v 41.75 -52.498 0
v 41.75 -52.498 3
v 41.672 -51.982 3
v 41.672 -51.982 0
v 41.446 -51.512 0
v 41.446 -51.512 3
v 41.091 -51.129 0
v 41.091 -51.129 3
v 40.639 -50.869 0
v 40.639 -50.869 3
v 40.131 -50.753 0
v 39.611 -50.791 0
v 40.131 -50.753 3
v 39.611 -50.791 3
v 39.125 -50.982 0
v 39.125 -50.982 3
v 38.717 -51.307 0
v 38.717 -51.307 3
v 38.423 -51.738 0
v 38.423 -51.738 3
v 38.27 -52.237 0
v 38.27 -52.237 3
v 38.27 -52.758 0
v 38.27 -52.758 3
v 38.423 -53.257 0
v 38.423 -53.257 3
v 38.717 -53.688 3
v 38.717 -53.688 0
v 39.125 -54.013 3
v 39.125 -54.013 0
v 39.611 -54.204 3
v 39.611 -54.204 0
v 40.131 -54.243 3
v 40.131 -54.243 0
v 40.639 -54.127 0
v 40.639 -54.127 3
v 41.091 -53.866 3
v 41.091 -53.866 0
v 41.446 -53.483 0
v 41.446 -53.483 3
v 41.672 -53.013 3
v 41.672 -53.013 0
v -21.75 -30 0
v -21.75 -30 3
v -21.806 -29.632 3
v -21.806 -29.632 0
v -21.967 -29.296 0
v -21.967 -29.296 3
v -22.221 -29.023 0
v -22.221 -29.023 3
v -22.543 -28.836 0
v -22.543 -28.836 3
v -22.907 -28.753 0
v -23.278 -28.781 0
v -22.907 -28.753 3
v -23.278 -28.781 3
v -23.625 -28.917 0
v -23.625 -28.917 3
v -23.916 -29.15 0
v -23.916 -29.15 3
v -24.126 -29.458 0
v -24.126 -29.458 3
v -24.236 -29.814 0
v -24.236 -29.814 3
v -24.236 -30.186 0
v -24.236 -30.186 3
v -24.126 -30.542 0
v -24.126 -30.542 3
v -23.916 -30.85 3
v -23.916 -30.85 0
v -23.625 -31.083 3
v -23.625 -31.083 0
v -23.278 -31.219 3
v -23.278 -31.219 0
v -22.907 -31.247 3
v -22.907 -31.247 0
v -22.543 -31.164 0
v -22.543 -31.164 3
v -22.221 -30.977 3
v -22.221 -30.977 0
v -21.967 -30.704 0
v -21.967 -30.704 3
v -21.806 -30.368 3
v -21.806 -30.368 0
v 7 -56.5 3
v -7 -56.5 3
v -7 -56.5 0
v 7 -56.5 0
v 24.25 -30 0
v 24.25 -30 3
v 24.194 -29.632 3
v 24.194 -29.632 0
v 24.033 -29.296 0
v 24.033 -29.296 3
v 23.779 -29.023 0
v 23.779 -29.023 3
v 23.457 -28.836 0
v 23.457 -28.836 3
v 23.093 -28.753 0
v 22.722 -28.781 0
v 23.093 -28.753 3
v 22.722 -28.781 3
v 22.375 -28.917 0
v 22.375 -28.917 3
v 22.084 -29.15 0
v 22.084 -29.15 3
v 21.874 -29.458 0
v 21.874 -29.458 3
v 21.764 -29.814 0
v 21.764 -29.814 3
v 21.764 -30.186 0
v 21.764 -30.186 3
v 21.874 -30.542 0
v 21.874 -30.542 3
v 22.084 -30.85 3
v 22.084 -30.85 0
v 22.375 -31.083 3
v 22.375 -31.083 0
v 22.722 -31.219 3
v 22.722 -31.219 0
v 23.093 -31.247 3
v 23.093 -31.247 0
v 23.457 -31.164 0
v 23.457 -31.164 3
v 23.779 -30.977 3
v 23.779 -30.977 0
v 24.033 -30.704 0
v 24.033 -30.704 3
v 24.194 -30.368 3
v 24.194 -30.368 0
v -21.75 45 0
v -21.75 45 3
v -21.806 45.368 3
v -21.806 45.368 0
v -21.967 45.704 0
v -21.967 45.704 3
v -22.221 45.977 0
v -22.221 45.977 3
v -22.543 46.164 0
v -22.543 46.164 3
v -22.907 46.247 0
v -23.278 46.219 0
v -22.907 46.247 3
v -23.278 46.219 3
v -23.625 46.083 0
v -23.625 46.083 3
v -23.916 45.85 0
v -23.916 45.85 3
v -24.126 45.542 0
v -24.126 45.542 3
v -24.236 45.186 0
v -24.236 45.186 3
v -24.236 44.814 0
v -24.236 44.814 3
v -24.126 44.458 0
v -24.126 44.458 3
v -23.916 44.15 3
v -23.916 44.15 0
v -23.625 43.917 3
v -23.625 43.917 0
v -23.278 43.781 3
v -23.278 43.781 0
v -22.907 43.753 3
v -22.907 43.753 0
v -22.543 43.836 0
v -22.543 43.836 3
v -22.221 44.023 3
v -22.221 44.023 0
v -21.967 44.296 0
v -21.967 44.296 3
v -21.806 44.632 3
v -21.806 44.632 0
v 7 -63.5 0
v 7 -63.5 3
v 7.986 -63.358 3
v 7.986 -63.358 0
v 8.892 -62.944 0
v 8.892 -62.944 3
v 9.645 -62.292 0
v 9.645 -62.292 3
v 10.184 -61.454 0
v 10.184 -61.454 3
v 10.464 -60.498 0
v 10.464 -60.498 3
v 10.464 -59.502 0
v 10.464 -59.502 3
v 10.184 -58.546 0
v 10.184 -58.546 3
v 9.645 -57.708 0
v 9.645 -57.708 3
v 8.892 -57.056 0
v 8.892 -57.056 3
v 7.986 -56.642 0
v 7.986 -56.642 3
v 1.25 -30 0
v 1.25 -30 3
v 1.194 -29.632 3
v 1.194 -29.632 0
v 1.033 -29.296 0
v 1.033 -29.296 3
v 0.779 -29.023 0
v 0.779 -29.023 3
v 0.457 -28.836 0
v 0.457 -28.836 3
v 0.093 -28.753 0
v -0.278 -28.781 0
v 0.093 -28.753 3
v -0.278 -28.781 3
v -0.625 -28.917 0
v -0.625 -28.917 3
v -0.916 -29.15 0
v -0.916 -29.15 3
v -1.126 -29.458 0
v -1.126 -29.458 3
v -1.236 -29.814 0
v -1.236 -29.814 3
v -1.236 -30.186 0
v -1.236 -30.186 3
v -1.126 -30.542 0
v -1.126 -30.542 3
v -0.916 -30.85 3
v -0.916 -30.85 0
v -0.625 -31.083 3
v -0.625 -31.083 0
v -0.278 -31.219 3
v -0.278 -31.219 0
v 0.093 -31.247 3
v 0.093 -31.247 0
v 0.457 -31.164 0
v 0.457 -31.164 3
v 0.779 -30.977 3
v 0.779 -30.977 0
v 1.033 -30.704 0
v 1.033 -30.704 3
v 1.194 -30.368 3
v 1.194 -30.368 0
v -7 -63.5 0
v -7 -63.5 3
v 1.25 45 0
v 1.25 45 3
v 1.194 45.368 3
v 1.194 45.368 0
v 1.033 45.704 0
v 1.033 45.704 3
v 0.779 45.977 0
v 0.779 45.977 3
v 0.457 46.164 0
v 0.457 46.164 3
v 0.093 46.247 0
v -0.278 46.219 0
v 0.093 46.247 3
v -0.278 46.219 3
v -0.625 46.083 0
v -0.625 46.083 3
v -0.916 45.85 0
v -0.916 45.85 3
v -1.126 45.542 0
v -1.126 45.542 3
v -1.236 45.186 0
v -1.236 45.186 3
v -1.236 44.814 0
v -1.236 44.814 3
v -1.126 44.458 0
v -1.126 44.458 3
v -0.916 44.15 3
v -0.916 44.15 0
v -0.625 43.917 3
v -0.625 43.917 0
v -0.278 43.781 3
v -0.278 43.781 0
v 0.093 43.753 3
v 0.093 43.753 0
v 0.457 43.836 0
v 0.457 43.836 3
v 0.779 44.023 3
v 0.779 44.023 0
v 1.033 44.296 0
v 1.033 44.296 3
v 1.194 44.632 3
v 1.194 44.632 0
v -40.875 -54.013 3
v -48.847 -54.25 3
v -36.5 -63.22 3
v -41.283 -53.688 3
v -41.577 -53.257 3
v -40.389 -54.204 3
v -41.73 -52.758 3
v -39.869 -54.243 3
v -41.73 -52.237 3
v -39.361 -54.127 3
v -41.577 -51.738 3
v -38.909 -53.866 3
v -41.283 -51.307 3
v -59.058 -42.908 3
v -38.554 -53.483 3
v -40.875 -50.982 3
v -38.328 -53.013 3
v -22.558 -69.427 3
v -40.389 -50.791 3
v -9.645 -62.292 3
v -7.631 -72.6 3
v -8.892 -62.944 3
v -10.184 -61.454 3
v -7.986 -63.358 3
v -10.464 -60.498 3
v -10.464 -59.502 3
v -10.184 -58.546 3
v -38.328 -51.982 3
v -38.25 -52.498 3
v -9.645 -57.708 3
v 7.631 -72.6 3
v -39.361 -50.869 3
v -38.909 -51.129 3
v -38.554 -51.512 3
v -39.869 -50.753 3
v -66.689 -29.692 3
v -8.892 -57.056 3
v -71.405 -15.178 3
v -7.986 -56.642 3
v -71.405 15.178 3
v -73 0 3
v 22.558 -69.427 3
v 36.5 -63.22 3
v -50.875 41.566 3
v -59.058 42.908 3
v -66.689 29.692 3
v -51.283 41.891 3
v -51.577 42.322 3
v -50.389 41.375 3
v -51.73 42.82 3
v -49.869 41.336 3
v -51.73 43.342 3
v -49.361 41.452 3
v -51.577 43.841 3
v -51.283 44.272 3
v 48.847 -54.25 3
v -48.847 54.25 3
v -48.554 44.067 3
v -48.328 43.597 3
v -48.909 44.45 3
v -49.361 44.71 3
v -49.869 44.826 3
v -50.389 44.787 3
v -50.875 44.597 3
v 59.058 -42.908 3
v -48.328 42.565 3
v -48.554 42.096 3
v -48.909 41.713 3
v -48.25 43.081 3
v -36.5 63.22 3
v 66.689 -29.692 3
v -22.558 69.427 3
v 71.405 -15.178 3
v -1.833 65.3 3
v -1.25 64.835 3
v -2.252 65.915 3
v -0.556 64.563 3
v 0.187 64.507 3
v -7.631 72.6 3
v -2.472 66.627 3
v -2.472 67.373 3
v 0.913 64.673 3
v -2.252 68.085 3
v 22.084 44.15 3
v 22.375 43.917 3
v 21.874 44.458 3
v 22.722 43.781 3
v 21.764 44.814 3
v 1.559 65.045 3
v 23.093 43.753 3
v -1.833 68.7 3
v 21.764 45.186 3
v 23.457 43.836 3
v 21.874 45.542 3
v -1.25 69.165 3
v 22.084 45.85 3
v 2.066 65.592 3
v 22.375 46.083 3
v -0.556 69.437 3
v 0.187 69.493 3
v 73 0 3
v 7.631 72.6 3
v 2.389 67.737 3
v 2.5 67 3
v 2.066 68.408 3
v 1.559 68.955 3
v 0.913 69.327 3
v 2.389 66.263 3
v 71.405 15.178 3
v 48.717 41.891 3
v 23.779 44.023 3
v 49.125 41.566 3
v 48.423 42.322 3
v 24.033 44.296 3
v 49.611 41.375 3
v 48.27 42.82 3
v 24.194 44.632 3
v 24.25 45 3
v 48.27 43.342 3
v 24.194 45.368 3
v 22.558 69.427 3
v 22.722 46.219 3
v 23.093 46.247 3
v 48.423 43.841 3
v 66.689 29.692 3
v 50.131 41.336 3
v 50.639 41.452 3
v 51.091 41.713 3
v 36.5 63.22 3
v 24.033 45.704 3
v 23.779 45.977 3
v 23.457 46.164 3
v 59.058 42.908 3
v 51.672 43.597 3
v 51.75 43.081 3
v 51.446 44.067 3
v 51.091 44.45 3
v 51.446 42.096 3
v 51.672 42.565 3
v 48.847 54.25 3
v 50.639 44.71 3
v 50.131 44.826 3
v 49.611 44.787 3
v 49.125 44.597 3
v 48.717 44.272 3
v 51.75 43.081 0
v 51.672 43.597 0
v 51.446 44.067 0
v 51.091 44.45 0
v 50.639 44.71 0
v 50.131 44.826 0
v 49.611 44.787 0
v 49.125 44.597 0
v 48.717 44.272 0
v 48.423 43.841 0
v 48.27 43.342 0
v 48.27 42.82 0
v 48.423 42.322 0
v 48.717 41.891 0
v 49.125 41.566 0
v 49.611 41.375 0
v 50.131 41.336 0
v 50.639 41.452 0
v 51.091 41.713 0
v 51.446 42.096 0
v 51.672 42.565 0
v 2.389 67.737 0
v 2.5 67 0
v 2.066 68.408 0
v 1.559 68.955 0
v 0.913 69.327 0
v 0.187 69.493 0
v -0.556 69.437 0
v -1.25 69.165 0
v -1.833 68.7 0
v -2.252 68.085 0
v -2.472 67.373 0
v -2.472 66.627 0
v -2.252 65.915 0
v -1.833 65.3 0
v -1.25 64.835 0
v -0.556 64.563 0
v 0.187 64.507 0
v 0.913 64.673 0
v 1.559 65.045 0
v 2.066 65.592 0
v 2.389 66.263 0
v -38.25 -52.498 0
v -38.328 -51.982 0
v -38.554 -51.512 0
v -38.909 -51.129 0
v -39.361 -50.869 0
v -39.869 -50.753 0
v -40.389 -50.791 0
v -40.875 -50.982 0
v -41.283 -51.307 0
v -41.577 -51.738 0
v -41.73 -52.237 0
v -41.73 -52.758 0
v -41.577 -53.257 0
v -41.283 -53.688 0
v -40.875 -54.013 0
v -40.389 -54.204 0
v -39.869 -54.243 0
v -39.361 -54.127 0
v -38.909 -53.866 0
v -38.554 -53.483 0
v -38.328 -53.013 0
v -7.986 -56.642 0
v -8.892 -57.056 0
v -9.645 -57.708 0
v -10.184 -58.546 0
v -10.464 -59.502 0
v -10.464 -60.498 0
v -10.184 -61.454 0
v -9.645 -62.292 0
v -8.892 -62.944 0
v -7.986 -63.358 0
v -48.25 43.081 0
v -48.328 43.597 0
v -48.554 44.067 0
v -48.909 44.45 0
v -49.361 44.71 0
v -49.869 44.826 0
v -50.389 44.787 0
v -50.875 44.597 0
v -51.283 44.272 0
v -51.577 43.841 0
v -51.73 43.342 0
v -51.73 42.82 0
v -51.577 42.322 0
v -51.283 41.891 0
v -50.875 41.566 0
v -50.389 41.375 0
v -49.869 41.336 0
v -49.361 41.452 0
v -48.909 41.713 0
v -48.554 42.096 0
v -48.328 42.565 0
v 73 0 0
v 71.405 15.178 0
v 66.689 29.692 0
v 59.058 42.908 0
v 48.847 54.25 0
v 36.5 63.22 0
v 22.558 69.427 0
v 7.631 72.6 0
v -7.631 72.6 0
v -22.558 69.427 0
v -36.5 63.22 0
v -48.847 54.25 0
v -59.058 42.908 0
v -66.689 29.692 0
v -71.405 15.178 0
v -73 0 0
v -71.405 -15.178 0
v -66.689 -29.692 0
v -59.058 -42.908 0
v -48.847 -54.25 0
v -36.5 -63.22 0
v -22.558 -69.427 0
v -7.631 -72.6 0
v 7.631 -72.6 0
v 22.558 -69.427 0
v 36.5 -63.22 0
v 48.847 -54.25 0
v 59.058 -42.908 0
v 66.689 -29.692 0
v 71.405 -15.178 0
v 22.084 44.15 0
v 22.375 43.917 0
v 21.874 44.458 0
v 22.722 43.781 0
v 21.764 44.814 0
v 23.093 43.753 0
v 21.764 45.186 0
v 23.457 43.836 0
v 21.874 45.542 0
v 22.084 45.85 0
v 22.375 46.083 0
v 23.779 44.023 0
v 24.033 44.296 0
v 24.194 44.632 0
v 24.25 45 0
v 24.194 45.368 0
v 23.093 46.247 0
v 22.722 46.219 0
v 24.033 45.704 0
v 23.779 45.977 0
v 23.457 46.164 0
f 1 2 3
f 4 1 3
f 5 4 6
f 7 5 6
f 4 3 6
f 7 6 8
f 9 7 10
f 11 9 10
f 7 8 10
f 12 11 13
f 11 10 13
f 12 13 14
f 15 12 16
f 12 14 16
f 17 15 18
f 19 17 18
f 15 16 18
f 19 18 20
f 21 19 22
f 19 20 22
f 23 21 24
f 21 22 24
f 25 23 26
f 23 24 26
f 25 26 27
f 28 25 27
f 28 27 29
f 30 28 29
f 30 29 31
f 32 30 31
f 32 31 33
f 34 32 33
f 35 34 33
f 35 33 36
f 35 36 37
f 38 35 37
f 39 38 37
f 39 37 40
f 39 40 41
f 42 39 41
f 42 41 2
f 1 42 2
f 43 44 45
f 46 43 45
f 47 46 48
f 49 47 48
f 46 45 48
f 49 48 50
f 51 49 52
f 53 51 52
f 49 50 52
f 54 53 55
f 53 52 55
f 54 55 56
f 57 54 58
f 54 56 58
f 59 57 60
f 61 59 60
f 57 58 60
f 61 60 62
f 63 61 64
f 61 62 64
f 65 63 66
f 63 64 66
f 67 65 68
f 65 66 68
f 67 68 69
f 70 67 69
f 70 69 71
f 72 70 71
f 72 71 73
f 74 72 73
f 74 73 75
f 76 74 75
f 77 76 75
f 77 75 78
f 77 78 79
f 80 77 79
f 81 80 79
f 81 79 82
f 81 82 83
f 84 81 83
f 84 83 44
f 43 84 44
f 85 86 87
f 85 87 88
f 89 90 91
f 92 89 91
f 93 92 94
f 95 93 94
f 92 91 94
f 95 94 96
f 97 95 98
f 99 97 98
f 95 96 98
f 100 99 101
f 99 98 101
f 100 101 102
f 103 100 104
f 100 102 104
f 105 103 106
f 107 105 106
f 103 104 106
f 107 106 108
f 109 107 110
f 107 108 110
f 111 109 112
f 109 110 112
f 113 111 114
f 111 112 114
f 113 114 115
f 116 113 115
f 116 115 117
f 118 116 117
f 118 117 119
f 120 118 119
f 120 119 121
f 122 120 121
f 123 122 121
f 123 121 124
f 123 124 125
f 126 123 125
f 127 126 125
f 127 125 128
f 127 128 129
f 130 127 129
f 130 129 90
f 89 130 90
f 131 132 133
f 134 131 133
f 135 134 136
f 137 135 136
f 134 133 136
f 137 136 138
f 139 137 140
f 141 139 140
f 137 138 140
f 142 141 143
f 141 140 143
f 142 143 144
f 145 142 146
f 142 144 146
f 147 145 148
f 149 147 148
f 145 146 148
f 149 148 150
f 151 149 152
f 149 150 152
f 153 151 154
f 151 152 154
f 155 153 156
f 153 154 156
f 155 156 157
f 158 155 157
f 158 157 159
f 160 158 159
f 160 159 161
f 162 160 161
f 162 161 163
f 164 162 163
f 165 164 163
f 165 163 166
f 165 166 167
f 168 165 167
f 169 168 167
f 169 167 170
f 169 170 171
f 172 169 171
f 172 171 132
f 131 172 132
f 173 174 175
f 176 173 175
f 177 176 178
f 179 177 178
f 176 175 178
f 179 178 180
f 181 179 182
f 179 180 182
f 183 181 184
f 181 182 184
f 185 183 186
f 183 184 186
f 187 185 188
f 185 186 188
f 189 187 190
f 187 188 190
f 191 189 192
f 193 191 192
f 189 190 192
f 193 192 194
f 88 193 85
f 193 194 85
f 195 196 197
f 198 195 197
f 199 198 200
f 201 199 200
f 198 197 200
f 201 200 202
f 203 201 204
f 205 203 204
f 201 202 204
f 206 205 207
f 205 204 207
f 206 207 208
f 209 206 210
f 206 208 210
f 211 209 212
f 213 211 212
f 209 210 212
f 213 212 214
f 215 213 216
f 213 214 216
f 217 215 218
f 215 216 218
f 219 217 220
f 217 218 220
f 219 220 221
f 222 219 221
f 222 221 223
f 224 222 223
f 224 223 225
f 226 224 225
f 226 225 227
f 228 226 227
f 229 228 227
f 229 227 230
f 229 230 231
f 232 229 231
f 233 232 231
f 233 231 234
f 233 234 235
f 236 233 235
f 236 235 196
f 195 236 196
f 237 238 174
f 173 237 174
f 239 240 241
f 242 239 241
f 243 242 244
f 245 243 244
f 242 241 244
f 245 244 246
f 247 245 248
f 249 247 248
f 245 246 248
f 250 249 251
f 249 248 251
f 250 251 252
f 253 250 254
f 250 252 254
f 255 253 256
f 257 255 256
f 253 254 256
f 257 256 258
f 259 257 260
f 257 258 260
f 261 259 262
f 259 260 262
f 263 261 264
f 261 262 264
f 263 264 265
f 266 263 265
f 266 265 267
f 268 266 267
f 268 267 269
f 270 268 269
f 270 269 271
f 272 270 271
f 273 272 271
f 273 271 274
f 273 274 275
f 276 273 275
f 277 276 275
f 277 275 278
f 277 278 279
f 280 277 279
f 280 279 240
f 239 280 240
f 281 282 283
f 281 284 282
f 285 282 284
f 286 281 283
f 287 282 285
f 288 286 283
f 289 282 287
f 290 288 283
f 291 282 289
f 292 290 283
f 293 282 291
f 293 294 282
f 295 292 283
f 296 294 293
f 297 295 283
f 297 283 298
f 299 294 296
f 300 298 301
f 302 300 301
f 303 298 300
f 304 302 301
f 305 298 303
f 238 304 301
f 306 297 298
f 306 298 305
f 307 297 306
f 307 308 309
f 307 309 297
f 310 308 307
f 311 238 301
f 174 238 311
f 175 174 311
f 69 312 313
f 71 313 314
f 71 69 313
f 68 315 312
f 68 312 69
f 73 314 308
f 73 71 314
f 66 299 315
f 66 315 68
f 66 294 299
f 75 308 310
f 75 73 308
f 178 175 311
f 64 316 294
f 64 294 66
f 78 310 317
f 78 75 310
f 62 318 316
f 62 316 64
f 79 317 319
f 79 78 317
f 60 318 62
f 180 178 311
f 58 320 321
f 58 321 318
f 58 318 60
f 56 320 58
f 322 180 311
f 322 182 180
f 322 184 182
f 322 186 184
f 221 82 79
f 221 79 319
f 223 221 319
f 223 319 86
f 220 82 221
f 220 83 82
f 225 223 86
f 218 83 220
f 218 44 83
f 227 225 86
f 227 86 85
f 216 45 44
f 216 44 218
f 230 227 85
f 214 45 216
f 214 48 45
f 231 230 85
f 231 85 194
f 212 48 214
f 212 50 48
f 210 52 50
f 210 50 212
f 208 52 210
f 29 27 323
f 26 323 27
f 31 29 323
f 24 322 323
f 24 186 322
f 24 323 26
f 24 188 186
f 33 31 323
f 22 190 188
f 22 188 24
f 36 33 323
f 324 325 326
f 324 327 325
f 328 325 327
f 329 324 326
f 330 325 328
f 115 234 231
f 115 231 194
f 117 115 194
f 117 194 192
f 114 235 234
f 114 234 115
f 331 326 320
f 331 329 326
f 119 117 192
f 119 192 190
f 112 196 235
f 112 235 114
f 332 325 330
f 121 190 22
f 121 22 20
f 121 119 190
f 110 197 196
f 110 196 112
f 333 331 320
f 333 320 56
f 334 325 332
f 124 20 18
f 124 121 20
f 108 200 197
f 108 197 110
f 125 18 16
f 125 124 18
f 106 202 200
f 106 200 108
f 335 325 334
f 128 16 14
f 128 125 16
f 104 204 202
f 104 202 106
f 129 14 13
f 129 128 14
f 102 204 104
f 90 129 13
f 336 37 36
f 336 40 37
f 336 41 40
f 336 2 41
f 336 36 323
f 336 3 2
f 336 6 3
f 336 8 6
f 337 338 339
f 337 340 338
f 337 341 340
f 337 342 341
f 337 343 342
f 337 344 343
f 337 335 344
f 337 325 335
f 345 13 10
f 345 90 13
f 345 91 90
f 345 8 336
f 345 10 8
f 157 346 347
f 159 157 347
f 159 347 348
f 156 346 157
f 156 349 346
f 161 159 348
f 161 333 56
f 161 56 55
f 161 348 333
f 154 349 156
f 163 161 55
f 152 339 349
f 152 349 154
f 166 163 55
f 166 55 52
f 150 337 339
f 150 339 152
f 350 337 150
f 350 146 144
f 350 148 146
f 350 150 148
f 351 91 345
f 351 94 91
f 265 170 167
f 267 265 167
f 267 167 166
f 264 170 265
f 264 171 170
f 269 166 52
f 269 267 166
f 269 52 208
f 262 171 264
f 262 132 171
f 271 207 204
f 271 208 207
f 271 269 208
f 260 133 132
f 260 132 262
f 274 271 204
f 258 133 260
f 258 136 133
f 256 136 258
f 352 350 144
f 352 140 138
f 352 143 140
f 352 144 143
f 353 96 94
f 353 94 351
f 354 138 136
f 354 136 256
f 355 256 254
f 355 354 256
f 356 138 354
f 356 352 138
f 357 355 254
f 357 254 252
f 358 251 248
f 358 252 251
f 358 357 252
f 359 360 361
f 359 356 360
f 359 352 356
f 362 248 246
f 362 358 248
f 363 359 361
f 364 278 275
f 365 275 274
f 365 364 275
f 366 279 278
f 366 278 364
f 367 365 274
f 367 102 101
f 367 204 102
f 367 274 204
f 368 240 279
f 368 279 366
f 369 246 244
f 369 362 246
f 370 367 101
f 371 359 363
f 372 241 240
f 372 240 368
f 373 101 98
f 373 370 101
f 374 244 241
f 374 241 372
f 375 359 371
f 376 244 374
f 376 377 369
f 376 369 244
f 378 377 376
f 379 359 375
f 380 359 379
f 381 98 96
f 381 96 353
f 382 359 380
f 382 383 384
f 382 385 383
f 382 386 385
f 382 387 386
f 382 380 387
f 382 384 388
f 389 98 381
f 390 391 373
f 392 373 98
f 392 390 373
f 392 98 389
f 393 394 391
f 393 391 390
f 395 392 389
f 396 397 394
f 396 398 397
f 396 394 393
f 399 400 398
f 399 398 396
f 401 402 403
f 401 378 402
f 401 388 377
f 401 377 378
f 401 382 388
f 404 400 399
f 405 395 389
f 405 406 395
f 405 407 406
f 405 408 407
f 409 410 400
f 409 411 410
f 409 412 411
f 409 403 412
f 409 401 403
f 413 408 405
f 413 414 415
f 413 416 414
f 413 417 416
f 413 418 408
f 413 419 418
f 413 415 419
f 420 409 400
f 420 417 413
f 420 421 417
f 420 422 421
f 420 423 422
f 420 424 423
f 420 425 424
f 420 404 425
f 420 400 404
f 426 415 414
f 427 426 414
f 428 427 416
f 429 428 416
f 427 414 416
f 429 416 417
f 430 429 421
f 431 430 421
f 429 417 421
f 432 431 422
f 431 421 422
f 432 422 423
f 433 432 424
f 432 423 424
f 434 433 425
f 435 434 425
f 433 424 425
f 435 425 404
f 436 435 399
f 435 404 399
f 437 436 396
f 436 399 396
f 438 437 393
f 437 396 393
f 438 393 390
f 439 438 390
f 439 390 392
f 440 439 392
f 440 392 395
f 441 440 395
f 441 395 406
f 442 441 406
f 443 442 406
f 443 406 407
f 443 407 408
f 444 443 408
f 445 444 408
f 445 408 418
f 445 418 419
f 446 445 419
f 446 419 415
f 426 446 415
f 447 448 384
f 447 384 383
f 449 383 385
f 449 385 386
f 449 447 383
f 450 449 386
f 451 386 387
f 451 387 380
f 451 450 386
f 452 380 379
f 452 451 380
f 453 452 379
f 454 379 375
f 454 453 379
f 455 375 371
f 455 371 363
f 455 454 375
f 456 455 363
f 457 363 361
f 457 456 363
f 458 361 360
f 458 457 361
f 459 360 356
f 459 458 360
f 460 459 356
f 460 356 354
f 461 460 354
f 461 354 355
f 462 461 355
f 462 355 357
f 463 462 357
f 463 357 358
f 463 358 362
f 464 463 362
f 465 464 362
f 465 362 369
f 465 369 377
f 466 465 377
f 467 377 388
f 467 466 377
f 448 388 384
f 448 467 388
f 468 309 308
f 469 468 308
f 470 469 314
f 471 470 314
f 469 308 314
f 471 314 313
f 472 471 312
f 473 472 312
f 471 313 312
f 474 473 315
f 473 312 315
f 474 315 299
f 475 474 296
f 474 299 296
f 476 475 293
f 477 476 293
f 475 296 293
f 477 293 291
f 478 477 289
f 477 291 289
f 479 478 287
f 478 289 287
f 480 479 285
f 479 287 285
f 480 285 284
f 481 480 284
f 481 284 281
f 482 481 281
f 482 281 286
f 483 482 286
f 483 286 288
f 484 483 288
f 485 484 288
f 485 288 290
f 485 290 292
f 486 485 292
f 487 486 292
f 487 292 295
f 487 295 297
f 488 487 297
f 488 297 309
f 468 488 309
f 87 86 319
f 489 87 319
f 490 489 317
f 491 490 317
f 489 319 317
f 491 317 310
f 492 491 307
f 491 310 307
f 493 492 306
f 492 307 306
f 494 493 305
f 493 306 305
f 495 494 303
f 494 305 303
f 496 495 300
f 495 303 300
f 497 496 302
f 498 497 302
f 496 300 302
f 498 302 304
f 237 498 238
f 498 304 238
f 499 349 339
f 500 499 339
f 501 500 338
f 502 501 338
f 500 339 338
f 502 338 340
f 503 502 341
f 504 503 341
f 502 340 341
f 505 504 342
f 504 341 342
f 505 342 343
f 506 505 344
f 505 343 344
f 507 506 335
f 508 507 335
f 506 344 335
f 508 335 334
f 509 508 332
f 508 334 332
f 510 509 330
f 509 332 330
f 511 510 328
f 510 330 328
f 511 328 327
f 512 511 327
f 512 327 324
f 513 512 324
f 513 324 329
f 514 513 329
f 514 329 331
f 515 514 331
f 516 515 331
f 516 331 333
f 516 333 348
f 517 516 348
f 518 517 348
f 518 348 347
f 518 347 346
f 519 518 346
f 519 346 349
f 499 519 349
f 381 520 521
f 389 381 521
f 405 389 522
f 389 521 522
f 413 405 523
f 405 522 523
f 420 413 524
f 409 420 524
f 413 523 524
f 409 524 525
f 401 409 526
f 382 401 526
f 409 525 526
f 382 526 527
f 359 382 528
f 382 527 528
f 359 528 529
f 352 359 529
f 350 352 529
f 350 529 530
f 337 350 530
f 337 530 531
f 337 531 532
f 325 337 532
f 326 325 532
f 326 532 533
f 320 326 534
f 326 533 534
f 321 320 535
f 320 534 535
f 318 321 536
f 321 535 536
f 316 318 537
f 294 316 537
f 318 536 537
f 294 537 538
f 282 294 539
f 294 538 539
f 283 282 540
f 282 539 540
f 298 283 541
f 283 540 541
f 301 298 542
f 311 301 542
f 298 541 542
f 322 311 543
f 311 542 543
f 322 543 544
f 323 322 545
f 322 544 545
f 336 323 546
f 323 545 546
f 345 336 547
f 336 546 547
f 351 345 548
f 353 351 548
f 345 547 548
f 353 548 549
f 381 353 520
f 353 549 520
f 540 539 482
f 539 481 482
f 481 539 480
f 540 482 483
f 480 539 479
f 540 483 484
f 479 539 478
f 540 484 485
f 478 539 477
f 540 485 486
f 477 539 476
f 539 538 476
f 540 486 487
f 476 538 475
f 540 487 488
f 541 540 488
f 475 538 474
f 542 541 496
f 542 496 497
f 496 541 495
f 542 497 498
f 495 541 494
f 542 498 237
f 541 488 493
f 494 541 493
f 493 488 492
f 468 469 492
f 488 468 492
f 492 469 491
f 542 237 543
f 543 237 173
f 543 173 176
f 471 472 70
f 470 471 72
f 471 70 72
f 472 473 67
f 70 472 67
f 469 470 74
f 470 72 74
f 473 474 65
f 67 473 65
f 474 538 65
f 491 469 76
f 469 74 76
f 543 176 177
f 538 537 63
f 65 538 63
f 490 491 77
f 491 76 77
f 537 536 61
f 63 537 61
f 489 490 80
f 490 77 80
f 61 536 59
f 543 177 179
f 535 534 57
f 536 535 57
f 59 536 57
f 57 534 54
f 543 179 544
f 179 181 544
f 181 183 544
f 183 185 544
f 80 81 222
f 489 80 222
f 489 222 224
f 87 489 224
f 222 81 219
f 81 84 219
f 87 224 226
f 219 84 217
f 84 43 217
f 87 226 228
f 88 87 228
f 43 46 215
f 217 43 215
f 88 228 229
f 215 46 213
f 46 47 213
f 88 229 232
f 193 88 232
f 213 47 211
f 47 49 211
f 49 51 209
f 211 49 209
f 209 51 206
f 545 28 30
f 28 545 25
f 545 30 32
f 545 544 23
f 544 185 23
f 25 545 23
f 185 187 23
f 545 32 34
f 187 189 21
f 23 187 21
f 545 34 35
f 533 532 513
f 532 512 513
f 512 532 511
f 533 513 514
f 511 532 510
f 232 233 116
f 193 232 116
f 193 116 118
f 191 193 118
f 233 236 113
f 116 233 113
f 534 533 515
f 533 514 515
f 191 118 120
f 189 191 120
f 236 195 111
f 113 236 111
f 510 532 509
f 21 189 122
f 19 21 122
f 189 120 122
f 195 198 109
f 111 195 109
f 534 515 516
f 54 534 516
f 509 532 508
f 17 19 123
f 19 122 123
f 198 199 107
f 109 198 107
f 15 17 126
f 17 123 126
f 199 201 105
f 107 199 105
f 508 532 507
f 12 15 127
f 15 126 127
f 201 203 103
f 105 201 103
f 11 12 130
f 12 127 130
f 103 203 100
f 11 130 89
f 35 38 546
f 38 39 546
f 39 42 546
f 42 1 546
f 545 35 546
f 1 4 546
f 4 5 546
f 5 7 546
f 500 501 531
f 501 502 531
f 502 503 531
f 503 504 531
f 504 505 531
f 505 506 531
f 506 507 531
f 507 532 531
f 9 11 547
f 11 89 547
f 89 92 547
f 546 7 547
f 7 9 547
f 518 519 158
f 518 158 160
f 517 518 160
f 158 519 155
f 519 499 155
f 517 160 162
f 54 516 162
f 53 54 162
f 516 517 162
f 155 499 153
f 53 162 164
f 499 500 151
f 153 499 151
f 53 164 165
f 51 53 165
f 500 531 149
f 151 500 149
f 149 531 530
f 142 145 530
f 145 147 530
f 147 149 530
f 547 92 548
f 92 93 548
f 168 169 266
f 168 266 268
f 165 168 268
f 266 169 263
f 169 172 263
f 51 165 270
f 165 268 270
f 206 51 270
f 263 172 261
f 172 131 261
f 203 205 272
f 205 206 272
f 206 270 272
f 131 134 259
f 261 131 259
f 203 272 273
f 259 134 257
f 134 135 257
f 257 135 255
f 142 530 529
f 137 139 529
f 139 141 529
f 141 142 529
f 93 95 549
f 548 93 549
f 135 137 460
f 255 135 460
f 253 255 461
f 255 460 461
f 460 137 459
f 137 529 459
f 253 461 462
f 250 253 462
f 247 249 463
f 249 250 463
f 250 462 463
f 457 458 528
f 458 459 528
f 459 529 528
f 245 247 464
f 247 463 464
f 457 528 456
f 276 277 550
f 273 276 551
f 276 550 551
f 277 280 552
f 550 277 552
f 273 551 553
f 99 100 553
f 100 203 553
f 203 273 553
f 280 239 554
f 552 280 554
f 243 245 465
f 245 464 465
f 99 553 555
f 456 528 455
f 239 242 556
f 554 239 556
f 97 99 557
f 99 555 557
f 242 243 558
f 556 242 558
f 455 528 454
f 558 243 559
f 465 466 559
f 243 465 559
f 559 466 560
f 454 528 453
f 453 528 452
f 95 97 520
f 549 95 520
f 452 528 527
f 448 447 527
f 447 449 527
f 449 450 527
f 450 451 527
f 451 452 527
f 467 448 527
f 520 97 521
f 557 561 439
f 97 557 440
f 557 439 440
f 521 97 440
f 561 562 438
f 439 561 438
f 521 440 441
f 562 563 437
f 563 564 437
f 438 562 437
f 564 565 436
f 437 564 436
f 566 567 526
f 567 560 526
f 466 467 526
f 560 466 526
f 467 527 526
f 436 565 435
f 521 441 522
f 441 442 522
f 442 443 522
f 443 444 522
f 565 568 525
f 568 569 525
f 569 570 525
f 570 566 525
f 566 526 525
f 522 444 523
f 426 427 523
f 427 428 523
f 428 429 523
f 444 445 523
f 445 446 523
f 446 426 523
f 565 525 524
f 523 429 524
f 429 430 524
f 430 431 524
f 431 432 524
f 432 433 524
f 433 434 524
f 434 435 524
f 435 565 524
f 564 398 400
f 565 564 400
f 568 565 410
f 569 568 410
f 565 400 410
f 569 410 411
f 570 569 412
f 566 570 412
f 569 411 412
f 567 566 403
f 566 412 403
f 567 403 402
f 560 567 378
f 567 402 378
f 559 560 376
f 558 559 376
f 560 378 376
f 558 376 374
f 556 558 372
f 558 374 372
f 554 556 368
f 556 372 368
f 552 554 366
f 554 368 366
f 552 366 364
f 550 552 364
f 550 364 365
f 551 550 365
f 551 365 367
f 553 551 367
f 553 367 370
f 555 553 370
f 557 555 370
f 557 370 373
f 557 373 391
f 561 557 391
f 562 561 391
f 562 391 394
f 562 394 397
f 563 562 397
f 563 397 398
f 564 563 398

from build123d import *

# Parameters (mm, degrees)
SKETCH_R        = 73
SKETCH_R_2      = 2.5
PAD_DEPTH       = 3
SKETCH002_R     = 1.75
POCKET_DEPTH    = 3.001
SKETCH003_R     = 1.25
POCKET001_DEPTH = 3.001


with BuildPart() as part:
    # Sketch → Pad (new body)
    with BuildSketch(Plane.XY):
        Circle(SKETCH_R)
        with Locations((0, 67)):
            Circle(SKETCH_R_2, mode=Mode.SUBTRACT)
    extrude(amount=PAD_DEPTH)

    # Sketch002 (on Face4 of Pad) → Pocket (cut, through all)
    with BuildSketch(Plane.XY.offset(3)):
        with Locations((-40, -52.497619)):
            Circle(SKETCH002_R)
        with Locations((40, -52.497619)):
            Circle(SKETCH002_R)
        with Locations((-50, 43.081318)):
            Circle(SKETCH002_R)
        with Locations((50, 43.081318)):
            Circle(SKETCH002_R)
    extrude(amount=-POCKET_DEPTH, mode=Mode.SUBTRACT)

    # Sketch003 (on Face3 of Pocket) → Pocket001 (cut, through all)
    with BuildSketch(Plane.XY.offset(3)):
        with Locations((-23, 45)):
            Circle(SKETCH003_R)
        with Locations((-23, -30)):
            Circle(SKETCH003_R)
        with Locations((0, 45)):
            Circle(SKETCH003_R)
        with Locations((0, -30)):
            Circle(SKETCH003_R)
        with Locations((23, 45)):
            Circle(SKETCH003_R)
        with Locations((23, -30)):
            Circle(SKETCH003_R)
        with BuildLine():
            ThreePointArc((-7, -56.5), (-10.5, -60), (-7, -63.5))
            Line((-7, -63.5), (7, -63.5))
            ThreePointArc((7, -63.5), (10.5, -60), (7, -56.5))
            Line((-7, -56.5), (7, -56.5))
        make_face()
    extrude(amount=-POCKET001_DEPTH, mode=Mode.SUBTRACT)


solid = part.part
